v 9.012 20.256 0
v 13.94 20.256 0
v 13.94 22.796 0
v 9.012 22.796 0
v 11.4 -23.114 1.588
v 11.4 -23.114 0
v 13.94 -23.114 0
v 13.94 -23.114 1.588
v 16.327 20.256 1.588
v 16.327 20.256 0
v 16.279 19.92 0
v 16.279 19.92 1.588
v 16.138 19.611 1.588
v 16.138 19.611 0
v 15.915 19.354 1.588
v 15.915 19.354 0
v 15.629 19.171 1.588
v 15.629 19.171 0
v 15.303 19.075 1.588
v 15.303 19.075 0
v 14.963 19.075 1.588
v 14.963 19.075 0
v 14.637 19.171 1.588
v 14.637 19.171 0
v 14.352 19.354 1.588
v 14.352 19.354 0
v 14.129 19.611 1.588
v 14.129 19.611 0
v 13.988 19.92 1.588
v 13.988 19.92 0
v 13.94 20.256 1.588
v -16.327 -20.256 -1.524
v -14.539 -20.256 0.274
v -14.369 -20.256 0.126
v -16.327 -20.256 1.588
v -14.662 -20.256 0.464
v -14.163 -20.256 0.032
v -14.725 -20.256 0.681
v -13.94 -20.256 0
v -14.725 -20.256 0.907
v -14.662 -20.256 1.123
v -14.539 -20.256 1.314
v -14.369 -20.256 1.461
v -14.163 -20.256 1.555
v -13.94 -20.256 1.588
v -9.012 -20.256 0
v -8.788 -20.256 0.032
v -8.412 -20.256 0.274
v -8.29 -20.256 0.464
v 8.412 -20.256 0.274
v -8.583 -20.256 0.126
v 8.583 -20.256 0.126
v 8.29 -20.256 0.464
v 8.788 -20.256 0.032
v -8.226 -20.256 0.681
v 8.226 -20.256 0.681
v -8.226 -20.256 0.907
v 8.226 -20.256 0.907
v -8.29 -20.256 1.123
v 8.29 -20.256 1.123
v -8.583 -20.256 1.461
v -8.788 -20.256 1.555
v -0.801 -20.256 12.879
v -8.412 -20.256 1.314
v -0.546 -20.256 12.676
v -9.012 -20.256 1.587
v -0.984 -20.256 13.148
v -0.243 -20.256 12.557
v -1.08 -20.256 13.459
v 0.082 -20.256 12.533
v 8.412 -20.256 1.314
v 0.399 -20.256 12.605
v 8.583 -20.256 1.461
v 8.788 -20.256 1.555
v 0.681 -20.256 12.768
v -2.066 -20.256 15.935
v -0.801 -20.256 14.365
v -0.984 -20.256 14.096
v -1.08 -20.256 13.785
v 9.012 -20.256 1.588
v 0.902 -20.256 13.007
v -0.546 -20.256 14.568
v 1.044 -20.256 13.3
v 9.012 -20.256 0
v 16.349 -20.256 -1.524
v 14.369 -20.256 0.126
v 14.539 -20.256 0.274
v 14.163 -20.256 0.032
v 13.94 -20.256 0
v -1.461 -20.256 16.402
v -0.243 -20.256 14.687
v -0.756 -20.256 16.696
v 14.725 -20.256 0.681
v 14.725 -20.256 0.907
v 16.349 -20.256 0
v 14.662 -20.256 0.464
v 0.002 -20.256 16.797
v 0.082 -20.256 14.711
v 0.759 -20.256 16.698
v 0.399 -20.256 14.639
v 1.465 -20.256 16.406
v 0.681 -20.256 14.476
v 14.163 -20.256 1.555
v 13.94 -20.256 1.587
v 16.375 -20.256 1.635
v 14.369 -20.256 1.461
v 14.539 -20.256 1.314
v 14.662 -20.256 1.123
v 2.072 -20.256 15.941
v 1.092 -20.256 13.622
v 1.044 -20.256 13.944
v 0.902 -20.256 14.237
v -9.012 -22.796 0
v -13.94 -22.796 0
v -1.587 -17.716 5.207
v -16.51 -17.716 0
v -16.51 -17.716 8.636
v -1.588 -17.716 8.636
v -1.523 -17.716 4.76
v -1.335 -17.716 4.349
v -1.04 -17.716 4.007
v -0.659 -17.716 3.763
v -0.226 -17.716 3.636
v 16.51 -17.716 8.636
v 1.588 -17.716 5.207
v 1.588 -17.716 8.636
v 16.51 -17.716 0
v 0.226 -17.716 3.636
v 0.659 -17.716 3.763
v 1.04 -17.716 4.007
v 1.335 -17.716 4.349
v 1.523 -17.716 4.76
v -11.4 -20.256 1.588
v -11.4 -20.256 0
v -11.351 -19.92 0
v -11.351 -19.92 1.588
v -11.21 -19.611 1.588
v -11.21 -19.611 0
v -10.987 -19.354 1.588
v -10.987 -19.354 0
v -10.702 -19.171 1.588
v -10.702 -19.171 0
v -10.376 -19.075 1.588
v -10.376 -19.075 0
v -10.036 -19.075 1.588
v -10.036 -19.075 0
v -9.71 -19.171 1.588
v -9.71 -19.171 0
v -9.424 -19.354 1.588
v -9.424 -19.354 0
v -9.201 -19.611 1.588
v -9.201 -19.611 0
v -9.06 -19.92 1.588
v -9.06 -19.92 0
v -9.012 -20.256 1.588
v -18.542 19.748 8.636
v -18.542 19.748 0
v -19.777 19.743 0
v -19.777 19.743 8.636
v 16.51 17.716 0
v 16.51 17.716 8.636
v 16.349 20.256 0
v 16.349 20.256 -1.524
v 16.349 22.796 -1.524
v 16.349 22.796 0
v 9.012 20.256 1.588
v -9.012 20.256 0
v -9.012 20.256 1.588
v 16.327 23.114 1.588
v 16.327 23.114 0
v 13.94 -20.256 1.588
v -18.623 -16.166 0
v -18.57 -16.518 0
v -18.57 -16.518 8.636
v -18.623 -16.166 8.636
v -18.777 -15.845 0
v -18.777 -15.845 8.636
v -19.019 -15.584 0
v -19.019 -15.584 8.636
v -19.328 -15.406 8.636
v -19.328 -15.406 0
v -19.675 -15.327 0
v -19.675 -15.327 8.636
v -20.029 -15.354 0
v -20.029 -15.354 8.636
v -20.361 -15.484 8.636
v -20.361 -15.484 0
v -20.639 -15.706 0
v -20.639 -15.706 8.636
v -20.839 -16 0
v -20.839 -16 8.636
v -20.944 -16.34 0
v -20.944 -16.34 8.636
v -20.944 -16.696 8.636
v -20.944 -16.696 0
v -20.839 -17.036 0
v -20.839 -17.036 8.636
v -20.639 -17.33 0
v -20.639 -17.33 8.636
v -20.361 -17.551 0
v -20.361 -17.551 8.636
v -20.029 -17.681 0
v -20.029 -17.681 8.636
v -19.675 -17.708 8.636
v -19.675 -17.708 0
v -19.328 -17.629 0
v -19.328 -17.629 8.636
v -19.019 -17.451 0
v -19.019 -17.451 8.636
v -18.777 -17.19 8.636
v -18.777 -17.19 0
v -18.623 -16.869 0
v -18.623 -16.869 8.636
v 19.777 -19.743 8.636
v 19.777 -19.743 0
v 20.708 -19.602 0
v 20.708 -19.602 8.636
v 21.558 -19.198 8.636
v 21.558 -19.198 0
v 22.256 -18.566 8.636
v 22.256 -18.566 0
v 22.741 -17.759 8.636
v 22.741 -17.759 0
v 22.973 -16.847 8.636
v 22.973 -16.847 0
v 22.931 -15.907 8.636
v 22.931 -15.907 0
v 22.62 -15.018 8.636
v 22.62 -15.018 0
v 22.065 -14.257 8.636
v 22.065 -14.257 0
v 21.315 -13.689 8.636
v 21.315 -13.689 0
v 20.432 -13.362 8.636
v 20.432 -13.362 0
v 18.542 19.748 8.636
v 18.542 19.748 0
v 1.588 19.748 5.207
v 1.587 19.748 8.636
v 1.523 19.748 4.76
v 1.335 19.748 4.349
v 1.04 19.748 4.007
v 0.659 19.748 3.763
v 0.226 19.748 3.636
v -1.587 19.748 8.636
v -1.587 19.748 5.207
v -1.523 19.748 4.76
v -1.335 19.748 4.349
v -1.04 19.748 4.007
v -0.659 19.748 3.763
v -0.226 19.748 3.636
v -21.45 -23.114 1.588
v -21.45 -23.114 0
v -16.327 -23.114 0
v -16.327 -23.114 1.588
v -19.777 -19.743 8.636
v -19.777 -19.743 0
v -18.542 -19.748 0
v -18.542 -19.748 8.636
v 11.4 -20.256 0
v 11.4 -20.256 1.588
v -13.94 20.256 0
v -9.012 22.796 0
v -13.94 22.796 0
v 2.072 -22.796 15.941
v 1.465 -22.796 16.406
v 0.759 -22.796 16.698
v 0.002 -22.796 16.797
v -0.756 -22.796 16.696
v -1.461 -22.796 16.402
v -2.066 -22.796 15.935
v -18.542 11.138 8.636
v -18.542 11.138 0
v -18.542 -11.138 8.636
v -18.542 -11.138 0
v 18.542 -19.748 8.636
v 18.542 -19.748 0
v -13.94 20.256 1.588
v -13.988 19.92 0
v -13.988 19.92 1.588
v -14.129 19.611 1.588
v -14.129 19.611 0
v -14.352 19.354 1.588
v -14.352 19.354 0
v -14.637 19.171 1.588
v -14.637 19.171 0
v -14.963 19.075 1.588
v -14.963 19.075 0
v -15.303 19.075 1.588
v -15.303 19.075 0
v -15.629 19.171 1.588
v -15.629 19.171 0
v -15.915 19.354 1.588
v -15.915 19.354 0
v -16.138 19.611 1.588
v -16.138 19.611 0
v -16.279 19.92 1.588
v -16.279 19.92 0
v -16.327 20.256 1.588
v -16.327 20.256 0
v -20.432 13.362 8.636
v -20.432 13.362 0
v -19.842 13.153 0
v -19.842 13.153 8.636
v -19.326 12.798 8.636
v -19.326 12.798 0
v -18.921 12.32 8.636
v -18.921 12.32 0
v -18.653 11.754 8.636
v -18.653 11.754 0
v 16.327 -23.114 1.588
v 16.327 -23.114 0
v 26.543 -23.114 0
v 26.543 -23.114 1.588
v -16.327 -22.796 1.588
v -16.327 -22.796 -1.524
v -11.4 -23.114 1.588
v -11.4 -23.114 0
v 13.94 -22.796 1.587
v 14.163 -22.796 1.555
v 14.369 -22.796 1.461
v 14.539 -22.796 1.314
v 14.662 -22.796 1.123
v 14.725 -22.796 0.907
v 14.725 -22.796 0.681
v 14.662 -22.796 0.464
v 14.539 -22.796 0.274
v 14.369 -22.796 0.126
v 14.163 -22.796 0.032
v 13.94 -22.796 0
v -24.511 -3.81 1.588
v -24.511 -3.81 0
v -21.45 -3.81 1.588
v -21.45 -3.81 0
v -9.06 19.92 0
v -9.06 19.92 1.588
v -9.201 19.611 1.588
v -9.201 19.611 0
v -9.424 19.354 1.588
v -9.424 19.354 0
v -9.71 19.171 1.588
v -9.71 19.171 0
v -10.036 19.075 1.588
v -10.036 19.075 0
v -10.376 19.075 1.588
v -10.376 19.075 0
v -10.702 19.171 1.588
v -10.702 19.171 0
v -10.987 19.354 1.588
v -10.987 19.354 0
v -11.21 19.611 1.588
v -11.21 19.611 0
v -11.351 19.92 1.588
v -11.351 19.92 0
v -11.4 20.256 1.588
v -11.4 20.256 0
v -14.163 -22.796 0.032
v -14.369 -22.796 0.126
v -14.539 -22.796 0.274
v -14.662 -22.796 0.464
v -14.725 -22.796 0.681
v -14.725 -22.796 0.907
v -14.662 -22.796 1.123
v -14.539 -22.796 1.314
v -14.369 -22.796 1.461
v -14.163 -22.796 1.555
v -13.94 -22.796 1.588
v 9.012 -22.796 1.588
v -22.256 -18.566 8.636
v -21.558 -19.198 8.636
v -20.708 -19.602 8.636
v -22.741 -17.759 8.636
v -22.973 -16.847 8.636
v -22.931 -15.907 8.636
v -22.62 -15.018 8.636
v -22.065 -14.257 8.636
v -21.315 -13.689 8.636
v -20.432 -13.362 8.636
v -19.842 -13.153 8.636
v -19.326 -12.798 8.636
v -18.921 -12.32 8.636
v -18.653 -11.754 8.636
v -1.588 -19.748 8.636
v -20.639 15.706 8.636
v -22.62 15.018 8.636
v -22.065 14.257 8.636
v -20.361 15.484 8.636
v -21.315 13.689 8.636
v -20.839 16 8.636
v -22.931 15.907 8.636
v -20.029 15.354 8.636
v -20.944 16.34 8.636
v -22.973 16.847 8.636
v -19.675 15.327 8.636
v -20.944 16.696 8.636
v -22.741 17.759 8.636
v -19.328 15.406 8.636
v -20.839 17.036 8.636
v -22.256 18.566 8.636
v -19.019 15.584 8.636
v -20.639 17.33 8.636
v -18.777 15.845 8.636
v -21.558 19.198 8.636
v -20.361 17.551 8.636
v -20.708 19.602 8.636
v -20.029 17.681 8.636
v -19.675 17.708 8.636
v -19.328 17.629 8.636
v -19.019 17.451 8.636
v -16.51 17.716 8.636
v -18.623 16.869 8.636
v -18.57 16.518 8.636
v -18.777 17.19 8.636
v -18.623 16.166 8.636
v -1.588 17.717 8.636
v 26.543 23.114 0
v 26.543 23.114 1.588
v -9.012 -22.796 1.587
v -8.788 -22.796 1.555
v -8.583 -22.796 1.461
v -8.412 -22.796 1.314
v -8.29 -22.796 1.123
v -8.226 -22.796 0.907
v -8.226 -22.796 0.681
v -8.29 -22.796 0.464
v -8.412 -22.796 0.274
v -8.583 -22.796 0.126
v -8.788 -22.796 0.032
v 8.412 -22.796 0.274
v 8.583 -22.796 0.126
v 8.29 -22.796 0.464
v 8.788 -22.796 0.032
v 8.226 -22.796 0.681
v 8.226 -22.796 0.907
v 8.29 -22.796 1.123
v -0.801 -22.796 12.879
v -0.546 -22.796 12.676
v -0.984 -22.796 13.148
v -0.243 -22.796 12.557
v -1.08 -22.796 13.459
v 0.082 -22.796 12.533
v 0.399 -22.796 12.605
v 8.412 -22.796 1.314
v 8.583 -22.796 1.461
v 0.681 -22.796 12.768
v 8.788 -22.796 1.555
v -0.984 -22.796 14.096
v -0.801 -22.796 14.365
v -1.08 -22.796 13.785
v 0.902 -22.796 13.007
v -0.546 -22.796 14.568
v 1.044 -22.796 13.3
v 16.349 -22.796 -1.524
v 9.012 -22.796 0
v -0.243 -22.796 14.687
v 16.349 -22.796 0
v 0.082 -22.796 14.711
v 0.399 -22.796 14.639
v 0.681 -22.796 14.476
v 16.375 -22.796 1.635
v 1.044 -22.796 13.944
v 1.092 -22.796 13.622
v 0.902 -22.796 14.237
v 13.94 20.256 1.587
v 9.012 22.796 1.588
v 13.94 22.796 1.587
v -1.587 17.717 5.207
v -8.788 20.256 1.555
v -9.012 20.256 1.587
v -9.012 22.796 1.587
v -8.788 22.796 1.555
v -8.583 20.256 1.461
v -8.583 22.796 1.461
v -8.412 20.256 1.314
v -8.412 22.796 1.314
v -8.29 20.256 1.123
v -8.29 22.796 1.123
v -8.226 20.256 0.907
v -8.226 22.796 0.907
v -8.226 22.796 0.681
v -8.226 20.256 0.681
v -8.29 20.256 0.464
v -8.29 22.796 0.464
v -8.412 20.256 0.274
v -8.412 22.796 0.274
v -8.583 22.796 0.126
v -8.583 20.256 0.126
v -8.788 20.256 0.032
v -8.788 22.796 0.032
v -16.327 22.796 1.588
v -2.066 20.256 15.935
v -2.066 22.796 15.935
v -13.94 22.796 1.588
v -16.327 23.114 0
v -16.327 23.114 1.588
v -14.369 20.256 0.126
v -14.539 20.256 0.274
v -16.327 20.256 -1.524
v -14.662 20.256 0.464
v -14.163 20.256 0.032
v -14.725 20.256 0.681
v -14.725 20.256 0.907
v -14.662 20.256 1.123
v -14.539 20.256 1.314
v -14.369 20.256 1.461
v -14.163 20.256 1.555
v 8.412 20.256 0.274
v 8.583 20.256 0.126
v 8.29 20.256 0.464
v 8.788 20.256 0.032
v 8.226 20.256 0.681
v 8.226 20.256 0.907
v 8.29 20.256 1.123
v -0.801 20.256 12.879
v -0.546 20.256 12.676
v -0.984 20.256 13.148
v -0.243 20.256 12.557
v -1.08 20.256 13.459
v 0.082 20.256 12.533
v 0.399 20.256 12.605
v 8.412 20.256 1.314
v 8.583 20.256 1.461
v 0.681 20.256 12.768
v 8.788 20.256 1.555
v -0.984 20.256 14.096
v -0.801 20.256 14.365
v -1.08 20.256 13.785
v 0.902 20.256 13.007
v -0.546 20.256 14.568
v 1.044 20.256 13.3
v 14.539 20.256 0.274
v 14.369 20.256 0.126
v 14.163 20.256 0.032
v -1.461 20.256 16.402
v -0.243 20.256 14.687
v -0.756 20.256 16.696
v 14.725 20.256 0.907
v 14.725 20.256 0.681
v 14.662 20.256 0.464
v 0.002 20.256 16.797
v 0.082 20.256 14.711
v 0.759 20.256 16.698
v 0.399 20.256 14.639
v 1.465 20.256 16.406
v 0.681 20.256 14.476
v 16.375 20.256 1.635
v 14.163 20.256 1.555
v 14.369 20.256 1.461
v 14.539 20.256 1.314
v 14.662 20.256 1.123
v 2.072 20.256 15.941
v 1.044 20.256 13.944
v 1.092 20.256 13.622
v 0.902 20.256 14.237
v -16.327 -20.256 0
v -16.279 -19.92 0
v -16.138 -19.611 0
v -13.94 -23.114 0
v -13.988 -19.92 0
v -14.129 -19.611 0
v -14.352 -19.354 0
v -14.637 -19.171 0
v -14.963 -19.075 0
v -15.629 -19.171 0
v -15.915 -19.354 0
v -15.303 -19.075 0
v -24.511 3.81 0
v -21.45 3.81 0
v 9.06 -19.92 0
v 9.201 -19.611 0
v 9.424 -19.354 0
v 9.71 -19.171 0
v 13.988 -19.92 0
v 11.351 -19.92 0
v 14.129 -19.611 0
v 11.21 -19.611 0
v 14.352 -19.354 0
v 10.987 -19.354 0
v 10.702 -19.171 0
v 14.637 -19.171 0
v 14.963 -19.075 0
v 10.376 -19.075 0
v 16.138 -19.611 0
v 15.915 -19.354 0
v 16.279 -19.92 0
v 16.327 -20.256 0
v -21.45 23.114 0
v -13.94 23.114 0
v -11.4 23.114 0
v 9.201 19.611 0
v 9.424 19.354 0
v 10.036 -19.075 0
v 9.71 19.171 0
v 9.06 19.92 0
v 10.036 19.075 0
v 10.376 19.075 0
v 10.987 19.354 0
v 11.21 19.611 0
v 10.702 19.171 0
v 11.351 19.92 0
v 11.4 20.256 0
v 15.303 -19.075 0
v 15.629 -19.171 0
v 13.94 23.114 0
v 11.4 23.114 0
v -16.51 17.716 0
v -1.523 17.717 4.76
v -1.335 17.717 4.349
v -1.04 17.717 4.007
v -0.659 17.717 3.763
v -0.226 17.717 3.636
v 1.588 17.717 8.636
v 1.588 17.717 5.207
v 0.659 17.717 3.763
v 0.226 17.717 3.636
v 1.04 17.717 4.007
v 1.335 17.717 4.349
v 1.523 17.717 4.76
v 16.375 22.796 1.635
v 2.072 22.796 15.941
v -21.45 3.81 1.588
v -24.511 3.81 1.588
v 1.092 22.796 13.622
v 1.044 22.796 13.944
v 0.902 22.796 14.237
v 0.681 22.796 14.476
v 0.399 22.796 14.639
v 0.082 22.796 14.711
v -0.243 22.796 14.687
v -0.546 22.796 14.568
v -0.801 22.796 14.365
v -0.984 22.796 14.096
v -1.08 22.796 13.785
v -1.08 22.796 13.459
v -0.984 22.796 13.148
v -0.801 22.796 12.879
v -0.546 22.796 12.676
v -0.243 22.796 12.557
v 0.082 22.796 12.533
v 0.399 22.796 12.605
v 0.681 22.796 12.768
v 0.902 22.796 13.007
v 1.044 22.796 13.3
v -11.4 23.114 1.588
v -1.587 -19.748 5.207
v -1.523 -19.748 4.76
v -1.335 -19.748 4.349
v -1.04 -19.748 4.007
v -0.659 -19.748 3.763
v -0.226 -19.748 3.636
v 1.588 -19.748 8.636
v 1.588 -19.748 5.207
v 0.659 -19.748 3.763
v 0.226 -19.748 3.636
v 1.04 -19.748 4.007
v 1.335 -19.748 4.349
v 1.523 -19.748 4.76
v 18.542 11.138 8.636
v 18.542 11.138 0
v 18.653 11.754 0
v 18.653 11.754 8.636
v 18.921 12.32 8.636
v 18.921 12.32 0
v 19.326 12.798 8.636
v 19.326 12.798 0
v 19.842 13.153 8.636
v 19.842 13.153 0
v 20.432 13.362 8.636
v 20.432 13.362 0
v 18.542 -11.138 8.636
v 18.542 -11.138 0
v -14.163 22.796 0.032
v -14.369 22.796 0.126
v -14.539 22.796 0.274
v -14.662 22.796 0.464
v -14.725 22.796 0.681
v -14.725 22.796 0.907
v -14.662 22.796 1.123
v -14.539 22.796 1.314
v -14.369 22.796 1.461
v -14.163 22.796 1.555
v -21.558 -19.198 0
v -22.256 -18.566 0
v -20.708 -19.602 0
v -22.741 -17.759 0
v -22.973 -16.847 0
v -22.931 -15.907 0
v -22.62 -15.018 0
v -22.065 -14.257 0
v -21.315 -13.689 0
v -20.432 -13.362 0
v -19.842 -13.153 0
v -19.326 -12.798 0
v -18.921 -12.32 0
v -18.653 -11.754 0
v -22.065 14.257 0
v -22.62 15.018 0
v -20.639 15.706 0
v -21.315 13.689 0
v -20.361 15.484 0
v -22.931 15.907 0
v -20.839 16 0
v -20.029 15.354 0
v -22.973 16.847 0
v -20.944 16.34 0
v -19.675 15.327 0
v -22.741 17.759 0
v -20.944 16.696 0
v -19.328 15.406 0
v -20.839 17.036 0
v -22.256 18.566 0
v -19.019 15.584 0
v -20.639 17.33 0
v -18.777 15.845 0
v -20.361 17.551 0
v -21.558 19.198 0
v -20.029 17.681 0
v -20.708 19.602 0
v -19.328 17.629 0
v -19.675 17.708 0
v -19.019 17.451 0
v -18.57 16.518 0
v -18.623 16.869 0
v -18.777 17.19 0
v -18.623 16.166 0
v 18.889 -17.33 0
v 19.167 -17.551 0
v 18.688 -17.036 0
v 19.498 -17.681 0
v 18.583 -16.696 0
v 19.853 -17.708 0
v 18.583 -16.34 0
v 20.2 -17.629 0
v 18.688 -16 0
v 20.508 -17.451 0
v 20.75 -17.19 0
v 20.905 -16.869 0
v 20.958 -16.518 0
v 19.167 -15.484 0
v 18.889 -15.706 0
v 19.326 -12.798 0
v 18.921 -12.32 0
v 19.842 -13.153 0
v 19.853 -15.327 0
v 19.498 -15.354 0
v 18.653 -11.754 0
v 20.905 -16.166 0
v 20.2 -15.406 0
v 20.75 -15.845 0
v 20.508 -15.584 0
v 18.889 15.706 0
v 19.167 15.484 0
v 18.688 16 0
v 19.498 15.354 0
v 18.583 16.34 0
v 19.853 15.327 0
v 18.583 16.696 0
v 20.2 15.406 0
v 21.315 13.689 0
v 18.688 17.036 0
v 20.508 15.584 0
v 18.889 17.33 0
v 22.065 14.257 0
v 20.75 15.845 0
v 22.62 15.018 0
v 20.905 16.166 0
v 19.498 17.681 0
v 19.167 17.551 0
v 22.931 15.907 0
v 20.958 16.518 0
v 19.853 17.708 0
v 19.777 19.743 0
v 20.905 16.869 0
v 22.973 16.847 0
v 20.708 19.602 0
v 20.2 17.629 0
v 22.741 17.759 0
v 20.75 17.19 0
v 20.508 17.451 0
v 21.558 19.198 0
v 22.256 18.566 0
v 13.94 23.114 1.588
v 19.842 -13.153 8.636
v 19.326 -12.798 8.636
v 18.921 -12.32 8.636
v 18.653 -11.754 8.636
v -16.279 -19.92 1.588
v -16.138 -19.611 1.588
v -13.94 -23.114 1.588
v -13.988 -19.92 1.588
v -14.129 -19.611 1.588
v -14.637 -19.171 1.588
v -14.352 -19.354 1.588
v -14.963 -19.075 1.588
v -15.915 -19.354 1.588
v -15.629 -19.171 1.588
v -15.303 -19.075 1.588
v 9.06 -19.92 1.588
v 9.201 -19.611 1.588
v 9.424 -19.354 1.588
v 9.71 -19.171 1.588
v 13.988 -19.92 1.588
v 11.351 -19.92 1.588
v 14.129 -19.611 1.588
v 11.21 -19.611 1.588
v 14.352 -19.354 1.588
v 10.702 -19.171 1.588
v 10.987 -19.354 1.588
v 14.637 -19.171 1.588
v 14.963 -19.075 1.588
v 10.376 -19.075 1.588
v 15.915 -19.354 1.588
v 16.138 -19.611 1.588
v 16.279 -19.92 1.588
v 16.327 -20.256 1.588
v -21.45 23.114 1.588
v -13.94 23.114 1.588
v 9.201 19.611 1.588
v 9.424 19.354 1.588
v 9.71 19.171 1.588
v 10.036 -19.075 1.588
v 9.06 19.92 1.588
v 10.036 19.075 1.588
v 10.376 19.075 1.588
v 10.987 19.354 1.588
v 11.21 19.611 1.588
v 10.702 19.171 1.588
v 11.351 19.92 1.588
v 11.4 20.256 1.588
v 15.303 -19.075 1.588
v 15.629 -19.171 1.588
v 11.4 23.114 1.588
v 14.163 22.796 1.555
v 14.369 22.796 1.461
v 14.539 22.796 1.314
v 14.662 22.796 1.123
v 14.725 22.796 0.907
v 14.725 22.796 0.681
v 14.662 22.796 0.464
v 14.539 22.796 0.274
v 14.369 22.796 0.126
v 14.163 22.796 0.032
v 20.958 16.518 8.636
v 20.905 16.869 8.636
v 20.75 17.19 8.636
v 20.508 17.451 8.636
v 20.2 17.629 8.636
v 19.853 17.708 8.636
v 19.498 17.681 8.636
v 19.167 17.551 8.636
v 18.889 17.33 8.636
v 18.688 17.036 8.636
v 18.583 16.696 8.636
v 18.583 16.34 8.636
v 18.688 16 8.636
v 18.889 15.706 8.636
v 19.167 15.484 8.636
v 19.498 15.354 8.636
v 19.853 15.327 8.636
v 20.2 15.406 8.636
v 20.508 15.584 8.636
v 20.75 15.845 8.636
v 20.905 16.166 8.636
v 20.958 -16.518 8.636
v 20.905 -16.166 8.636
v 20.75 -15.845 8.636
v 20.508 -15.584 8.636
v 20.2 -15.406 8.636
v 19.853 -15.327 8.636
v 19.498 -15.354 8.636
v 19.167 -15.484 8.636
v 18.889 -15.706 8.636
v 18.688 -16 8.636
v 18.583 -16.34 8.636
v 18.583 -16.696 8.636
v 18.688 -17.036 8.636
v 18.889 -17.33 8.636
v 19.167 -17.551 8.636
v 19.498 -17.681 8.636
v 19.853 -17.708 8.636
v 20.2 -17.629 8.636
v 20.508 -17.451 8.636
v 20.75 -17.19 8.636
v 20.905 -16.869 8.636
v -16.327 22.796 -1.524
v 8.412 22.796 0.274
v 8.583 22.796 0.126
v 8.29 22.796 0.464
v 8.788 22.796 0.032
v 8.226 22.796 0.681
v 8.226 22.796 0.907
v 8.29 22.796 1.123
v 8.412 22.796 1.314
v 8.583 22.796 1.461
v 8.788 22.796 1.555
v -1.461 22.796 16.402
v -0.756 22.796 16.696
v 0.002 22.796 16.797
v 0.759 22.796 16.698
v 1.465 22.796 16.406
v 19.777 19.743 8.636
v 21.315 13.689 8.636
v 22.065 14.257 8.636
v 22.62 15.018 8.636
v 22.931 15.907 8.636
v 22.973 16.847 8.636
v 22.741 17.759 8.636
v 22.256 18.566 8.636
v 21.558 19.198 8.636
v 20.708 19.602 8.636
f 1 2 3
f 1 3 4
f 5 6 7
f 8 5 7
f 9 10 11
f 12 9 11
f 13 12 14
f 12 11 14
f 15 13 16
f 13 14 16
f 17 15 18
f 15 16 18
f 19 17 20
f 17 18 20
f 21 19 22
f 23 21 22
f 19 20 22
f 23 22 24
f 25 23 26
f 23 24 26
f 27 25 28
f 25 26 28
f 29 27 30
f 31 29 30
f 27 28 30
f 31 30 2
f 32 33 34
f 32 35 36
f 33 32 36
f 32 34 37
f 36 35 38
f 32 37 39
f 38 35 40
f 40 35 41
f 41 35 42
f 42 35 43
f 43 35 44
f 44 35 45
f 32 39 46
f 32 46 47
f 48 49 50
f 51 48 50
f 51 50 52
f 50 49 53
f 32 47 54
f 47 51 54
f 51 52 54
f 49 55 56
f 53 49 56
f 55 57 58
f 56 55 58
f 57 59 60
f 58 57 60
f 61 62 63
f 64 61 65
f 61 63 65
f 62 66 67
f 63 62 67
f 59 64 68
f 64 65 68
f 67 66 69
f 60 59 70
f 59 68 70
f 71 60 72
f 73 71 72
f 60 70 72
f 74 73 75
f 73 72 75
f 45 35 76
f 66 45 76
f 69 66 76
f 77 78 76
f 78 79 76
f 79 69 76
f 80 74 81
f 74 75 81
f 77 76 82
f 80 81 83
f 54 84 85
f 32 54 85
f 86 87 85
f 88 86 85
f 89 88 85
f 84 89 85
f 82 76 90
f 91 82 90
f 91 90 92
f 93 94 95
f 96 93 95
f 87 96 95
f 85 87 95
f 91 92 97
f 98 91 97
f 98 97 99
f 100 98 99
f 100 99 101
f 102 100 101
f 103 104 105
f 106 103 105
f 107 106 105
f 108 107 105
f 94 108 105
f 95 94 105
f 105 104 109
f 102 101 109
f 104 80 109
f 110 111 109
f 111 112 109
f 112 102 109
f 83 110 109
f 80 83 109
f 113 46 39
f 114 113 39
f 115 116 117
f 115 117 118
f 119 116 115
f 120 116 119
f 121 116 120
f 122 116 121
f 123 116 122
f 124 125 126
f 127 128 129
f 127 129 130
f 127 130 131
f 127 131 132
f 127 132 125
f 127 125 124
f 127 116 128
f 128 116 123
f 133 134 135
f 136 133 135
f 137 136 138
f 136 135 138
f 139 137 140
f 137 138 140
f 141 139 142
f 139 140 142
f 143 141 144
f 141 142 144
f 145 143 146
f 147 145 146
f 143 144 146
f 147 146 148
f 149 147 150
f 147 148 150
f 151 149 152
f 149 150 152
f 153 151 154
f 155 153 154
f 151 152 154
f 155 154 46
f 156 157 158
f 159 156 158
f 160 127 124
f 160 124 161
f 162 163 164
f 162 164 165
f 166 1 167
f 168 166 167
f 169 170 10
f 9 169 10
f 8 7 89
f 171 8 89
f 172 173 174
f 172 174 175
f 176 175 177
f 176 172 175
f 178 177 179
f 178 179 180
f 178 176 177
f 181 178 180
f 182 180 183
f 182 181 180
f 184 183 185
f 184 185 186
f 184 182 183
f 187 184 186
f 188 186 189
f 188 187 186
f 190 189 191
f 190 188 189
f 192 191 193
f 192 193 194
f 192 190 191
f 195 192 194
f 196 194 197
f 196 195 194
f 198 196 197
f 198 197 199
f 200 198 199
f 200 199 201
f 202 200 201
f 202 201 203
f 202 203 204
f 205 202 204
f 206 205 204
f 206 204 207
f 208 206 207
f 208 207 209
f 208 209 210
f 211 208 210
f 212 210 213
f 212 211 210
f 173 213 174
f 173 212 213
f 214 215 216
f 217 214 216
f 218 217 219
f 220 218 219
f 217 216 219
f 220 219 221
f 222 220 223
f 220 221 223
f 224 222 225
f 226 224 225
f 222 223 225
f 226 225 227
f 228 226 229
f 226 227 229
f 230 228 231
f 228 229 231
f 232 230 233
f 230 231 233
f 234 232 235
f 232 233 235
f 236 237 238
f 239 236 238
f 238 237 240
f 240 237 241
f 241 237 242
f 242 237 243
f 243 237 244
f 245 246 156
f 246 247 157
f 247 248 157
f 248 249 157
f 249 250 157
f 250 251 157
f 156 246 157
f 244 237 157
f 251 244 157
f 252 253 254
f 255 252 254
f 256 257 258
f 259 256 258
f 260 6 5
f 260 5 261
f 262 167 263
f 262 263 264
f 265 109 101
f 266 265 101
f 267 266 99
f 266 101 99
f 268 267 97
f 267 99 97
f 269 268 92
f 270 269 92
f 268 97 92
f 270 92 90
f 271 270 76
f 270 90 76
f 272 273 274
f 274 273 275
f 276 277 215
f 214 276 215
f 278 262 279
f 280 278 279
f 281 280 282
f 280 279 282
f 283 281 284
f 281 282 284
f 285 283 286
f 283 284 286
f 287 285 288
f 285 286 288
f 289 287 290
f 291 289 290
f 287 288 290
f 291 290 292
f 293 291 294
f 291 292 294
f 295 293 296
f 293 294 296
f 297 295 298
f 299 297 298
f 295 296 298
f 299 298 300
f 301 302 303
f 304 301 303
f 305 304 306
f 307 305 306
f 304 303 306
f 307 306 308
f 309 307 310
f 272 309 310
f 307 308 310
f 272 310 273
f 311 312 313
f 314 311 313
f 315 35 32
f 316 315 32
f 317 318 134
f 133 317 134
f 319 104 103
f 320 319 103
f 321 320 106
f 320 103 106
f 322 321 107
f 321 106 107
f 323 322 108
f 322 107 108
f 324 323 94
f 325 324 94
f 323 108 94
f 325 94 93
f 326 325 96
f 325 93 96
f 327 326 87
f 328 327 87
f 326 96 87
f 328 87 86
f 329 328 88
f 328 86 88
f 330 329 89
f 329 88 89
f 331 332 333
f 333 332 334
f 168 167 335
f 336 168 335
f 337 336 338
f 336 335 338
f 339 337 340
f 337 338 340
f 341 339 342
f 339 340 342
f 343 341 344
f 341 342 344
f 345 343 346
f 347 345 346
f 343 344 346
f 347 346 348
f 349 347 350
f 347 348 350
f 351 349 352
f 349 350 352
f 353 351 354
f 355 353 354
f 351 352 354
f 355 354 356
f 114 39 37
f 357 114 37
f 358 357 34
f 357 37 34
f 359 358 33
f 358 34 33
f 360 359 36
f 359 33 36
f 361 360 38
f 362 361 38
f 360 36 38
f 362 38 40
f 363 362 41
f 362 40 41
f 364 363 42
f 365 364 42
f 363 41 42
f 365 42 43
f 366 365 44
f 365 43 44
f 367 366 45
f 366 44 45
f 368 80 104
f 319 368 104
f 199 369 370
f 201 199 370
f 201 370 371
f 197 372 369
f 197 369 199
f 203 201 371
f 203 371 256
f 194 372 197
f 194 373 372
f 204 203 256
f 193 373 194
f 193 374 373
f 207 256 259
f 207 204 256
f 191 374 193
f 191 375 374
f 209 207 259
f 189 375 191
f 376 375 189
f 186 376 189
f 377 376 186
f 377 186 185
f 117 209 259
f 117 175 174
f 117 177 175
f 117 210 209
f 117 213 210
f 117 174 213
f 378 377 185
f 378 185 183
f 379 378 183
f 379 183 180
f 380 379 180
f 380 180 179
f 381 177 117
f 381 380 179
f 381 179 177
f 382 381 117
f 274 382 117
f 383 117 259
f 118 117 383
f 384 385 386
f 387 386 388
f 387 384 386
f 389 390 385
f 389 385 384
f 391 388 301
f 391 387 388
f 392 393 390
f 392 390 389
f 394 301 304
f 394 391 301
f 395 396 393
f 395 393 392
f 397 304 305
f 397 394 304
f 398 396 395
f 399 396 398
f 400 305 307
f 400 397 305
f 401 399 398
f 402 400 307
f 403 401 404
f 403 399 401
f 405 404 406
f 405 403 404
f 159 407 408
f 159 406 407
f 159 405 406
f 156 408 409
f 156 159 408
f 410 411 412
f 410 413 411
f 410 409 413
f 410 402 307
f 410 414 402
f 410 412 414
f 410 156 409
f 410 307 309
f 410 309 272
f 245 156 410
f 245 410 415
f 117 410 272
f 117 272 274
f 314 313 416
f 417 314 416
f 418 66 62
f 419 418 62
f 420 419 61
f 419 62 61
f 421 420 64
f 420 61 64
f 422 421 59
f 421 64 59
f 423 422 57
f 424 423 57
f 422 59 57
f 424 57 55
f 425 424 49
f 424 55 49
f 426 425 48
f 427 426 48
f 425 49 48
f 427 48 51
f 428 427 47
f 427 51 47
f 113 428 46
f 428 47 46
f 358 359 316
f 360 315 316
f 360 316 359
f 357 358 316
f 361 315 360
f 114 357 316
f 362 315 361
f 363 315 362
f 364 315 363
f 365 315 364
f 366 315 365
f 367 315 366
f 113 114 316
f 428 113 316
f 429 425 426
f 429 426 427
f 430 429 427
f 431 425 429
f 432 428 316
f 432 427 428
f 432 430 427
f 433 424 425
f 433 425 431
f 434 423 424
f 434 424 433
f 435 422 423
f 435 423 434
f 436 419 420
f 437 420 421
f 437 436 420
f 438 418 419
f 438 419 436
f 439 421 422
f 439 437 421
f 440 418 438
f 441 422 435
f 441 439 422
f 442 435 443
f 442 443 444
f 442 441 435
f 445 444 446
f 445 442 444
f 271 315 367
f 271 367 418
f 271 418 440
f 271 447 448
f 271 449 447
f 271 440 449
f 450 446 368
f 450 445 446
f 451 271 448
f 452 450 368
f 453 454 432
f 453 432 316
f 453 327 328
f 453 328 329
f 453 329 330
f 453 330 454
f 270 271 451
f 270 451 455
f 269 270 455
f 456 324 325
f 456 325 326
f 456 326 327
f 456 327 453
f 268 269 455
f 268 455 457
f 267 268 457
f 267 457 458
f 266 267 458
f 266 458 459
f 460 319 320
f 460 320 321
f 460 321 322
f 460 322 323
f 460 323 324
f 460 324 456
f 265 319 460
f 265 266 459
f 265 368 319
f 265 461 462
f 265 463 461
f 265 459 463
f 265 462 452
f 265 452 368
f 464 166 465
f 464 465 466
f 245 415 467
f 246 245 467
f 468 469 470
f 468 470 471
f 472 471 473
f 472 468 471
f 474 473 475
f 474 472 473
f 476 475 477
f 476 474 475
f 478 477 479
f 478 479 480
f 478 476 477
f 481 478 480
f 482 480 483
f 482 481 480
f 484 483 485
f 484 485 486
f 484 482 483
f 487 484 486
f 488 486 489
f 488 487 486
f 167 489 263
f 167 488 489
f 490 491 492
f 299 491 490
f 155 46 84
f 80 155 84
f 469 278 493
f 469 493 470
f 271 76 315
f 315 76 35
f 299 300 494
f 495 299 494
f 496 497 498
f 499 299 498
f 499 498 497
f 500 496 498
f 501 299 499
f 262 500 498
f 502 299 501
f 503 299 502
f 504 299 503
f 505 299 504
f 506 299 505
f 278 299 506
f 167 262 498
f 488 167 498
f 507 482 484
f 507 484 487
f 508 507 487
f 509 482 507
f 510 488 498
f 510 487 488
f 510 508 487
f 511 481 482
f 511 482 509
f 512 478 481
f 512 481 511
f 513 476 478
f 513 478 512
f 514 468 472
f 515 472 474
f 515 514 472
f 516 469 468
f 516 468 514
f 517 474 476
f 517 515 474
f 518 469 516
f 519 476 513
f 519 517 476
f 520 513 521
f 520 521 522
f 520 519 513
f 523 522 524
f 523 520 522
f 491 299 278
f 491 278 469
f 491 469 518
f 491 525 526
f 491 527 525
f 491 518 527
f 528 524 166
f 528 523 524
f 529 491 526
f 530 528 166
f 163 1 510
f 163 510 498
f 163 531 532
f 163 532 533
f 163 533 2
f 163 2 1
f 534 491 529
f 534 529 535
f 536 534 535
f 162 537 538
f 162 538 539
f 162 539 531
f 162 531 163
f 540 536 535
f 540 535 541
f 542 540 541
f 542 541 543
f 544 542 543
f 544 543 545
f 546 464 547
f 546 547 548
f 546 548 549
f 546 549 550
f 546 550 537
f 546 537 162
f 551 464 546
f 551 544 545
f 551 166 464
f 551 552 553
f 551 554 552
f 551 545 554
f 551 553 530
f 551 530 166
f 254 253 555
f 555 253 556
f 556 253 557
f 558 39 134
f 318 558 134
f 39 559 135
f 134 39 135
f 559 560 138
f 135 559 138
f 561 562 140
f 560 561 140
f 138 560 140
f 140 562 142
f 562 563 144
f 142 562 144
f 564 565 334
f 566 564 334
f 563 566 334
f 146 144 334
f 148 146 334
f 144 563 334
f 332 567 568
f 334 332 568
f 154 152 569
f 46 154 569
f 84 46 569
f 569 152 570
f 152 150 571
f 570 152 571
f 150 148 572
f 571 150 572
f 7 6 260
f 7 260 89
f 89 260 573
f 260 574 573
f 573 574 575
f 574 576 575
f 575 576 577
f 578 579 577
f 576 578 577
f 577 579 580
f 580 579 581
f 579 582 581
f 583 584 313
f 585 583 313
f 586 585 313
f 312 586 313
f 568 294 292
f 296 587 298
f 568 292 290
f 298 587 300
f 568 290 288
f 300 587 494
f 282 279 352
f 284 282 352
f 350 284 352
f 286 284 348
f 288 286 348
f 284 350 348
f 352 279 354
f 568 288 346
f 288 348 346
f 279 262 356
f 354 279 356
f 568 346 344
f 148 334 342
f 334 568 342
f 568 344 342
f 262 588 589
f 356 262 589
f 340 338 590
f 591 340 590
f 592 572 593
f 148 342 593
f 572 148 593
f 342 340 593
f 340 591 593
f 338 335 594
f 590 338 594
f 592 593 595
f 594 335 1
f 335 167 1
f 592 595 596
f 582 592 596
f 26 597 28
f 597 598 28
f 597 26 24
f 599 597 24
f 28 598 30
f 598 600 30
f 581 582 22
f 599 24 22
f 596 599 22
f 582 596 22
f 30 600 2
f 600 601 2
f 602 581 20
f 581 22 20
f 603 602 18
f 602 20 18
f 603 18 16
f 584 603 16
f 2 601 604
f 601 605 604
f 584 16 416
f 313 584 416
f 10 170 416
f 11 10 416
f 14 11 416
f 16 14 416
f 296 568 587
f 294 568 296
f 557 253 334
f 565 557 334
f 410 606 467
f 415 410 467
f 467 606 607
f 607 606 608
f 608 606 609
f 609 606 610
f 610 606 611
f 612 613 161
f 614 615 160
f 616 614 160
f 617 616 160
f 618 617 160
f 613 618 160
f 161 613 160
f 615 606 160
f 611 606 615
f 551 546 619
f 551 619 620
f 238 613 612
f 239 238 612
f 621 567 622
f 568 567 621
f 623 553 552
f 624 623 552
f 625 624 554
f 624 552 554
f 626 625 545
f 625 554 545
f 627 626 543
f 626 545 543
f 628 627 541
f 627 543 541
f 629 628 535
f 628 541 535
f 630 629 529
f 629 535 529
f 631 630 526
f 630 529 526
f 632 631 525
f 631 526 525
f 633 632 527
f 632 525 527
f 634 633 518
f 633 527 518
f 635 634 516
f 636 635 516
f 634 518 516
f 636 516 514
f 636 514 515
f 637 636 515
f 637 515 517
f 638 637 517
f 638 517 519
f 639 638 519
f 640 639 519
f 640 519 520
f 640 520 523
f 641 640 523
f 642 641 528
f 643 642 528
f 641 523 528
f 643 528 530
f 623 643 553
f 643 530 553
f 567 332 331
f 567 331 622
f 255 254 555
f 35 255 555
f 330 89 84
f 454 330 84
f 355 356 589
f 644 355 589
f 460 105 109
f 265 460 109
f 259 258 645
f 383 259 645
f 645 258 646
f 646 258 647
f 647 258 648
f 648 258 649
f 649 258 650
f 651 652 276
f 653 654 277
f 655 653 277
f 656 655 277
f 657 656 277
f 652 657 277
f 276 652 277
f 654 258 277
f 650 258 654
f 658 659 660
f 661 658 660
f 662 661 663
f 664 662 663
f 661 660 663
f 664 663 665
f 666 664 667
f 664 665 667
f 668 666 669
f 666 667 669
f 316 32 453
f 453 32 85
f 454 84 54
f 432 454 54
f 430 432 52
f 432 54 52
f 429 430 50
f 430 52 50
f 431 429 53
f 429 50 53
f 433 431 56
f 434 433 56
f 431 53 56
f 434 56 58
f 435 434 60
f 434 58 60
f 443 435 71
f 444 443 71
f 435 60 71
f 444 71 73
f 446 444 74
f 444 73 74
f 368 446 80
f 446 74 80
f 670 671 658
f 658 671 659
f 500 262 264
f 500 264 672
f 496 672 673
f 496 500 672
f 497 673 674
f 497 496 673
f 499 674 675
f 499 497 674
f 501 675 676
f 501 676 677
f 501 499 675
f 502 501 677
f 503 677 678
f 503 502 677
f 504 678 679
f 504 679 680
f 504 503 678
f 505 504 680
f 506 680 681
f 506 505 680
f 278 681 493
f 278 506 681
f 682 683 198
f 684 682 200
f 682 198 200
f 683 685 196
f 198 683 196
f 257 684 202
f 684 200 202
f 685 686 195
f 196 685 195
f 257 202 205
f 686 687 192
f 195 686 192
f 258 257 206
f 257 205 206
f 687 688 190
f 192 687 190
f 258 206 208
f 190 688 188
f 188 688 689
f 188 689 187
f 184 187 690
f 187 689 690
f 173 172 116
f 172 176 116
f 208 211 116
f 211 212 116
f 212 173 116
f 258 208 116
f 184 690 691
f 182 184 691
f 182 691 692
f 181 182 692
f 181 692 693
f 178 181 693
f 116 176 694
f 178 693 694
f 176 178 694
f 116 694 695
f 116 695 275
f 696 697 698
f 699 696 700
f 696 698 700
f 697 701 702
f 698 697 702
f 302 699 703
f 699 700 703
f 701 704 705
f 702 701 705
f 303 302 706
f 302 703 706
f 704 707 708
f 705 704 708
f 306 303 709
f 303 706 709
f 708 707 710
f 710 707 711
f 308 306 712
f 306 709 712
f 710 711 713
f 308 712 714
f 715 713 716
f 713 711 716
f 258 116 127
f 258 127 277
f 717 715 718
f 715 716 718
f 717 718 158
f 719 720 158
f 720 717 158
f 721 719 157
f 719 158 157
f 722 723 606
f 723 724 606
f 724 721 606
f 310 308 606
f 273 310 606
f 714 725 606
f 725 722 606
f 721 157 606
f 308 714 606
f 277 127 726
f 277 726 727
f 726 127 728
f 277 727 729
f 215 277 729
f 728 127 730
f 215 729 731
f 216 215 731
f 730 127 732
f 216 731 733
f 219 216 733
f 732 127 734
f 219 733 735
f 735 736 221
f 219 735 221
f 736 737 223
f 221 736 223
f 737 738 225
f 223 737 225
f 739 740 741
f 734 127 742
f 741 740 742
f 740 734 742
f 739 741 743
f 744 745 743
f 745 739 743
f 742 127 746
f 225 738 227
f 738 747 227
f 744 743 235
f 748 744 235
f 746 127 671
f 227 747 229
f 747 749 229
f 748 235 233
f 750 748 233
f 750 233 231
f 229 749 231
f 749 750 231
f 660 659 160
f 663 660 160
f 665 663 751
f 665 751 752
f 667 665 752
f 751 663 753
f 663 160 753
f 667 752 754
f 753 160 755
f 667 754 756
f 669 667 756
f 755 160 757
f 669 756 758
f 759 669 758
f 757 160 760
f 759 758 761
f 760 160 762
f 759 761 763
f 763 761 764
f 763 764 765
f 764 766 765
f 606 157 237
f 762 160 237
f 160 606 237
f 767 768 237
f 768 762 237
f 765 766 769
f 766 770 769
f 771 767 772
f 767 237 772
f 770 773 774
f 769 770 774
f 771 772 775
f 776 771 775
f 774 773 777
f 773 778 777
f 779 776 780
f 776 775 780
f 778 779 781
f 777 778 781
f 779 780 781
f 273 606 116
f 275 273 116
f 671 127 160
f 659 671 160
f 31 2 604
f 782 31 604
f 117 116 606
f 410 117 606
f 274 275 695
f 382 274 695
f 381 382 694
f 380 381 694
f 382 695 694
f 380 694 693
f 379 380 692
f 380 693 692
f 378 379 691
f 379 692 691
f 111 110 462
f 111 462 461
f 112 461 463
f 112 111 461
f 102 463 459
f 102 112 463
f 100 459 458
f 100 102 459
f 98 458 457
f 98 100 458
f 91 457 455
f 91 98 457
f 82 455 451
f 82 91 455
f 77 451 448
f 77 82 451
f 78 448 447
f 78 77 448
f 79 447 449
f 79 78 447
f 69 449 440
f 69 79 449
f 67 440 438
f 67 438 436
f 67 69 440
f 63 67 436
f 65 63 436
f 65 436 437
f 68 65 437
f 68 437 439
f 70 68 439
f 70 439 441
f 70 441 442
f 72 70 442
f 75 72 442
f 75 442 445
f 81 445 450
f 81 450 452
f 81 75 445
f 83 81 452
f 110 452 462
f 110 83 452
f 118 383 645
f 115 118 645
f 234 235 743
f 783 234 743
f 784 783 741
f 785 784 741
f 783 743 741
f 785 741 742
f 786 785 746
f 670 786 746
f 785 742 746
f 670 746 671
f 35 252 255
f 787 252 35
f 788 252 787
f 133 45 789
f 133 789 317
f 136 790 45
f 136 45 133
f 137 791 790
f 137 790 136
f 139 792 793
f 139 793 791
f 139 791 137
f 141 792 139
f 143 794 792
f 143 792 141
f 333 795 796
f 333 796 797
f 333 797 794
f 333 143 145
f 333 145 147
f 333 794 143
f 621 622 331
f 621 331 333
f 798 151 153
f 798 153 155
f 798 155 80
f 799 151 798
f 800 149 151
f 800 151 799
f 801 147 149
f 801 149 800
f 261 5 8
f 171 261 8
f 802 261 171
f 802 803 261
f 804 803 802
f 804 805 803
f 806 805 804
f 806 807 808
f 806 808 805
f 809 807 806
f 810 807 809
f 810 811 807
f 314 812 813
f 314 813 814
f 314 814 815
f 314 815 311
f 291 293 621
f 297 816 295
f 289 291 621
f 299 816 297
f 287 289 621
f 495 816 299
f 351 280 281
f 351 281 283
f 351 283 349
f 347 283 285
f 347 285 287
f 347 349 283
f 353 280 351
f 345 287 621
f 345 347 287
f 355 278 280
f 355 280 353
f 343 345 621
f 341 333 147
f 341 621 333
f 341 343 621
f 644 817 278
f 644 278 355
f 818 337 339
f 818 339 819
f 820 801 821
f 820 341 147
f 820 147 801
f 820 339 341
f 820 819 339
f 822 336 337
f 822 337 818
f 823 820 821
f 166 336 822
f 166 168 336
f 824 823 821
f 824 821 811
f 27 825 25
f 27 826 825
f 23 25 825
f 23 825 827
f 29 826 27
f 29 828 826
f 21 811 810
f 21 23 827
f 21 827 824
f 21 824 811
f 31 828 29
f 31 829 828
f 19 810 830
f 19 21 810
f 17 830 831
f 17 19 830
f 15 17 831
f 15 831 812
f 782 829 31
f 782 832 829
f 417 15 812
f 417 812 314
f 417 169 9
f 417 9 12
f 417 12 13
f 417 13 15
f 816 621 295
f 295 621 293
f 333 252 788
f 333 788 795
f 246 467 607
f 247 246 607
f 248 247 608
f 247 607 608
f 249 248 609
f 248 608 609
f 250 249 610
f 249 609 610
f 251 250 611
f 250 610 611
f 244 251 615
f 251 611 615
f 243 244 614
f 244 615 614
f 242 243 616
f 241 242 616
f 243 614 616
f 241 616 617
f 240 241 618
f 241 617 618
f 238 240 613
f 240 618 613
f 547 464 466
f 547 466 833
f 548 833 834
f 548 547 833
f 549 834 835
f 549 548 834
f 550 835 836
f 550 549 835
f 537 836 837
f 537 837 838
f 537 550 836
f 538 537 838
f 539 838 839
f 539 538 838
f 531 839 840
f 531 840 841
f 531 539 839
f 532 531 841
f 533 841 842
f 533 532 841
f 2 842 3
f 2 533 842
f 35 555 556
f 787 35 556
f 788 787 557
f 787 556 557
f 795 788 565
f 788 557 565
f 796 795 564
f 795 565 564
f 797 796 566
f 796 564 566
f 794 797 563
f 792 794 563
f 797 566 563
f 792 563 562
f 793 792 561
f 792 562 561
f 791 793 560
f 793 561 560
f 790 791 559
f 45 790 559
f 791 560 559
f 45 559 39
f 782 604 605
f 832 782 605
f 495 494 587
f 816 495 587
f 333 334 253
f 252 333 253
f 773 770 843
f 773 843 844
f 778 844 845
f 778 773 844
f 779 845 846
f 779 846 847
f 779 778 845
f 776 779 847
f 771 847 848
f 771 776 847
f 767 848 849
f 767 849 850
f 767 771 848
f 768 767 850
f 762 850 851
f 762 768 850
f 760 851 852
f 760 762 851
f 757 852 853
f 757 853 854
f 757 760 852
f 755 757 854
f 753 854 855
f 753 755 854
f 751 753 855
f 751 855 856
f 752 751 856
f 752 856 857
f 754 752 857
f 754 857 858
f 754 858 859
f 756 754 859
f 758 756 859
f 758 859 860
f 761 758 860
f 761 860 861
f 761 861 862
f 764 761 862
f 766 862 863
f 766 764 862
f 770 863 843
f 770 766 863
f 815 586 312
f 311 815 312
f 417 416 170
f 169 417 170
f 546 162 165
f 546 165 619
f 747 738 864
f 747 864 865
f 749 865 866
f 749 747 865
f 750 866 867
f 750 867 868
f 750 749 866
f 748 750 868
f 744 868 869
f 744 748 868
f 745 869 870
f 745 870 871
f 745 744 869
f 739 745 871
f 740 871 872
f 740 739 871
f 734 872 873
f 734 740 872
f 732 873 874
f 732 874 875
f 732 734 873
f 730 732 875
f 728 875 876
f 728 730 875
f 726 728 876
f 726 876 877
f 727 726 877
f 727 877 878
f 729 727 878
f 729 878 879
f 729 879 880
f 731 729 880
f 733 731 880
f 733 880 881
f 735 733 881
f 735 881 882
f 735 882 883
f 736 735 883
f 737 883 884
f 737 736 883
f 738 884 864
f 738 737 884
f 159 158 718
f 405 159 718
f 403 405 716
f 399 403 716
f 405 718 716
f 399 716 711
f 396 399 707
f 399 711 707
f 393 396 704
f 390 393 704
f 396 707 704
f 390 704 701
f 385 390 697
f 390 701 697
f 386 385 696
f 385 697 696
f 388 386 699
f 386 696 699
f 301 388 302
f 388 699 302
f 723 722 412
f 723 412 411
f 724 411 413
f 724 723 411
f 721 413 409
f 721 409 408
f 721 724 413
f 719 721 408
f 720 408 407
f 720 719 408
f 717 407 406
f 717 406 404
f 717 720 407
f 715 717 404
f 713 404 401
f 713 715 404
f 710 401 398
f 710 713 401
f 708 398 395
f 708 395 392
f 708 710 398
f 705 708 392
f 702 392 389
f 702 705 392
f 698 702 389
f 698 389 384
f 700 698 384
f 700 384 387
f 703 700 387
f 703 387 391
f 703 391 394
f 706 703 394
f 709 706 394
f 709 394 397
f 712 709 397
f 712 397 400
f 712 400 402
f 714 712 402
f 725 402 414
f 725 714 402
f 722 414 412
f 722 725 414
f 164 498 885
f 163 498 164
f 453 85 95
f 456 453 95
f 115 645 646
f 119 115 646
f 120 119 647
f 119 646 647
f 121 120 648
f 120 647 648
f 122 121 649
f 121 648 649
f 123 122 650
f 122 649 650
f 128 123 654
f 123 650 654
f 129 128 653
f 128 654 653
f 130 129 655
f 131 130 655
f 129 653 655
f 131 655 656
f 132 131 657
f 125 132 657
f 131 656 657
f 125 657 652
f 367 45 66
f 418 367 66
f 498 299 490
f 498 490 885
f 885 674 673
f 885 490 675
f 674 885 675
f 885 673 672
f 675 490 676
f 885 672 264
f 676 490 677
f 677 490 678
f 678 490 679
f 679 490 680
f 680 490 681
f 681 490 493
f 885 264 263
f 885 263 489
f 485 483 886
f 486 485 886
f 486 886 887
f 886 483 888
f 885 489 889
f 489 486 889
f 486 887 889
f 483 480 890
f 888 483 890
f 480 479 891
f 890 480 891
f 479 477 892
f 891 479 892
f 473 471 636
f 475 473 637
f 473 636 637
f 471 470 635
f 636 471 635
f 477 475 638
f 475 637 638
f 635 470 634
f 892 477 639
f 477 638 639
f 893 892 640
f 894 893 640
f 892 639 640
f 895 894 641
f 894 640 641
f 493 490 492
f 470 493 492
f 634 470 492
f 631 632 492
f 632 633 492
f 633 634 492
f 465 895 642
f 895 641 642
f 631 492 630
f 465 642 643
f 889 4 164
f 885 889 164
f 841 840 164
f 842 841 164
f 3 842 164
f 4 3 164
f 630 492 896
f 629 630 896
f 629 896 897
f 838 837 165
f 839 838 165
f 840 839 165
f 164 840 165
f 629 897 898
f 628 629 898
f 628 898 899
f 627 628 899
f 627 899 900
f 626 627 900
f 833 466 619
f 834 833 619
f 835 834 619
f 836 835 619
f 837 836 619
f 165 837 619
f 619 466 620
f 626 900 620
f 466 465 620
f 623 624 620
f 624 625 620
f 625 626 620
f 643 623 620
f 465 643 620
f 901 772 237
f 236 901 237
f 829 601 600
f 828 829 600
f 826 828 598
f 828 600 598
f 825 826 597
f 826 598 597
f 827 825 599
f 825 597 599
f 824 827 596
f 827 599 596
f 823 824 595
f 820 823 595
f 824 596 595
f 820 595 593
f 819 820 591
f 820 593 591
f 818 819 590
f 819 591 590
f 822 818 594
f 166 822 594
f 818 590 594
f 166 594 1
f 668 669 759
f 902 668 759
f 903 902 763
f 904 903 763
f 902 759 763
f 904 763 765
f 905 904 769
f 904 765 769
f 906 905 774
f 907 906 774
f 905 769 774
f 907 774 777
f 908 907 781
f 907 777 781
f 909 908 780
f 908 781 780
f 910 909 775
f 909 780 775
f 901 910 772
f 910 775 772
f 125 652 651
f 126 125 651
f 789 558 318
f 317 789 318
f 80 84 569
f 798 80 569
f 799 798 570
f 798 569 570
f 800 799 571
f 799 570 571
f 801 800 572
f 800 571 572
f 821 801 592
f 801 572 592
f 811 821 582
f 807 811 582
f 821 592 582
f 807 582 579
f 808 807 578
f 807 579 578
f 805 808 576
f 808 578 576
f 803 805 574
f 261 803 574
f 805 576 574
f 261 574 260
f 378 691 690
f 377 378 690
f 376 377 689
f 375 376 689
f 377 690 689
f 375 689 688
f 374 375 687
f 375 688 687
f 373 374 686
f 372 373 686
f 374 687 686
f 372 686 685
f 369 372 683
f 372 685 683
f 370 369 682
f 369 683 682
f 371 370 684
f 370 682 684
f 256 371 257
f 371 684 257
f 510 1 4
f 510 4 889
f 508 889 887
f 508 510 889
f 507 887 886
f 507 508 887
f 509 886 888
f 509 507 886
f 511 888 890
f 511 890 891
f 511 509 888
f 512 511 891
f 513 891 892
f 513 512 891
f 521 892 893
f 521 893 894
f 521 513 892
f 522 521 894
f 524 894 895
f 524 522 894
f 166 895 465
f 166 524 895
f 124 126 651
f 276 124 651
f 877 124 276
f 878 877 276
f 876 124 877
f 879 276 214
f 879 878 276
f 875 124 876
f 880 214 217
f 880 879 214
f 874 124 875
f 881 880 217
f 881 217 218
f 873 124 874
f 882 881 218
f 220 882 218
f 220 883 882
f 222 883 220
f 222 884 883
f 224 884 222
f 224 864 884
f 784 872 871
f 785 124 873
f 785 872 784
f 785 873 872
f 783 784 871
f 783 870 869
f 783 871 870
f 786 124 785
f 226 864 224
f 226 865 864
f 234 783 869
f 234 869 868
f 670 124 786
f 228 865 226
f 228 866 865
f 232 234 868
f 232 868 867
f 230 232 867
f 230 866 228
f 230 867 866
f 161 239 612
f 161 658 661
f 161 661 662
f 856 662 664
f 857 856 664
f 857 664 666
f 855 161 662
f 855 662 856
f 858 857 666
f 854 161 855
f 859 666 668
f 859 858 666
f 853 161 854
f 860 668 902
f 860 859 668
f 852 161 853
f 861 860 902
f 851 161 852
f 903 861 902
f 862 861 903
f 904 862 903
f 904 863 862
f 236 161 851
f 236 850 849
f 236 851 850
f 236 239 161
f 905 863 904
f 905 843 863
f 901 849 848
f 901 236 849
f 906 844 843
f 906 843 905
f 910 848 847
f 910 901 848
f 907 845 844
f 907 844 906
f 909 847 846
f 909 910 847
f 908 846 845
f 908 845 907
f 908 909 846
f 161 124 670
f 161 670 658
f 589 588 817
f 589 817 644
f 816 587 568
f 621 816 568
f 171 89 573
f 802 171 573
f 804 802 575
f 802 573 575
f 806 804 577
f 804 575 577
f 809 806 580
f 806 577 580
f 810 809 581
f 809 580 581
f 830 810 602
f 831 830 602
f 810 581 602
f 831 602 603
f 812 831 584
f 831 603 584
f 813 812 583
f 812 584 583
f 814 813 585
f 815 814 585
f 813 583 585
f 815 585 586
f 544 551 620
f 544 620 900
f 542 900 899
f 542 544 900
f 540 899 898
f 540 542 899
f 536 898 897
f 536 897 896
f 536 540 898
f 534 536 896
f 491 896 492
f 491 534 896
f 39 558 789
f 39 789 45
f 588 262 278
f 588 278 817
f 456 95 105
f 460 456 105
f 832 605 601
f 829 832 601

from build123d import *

# Parameters (mm, degrees)
F0_W     = 3.0607
F0_H     = 7.62
F0_W_2   = 2.54
F0_H_2   = 2.8575
F1_DEPTH = 1.5875
F2_R     = 1.0922
F3_DEPTH = 2.54
F5_W     = 33.02
F5_H     = 35.433
F5_R     = 1.1938
F6_DEPTH = 8.636
F8_DEPTH = 42.8635


with BuildPart() as f1:
    # F0 (on Top) → F1 (new body)
    with BuildSketch(Plane.XY):
        with BuildLine():
            Line((-16.32712, 23.114), (-21.4503, 23.114))
            Line((-21.4503, 23.114), (-21.4503, 3.81))
            Line((-21.4503, 3.81), (-21.4503, -3.81))
            Line((-21.4503, -3.81), (-21.4503, -23.114))
            Line((-21.4503, -23.114), (-16.32712, -23.114))
            Line((-16.32712, -23.114), (-16.32712, -20.2565))
            ThreePointArc((-16.32712, -20.2565), (-15.13332, -19.0627), (-13.93952, -20.2565))
            Line((-13.93952, -20.2565), (-11.39952, -20.2565))
            ThreePointArc((-11.39952, -20.2565), (-10.20572, -19.0627), (-9.01192, -20.2565))
            Line((-9.01192, -20.2565), (9.01192, -20.2565))
            ThreePointArc((9.01192, -20.2565), (10.20572, -19.0627), (11.39952, -20.2565))
            Line((11.39952, -20.2565), (13.93952, -20.2565))
            ThreePointArc((13.93952, -20.2565), (15.13332, -19.0627), (16.32712, -20.2565))
            Line((16.32712, -20.2565), (16.32712, -23.114))
            Line((16.32712, -23.114), (21.4503, -23.114))
            Line((21.4503, -23.114), (26.543, -23.114))
            Line((26.543, -23.114), (26.543, 23.114))
            Line((26.543, 23.114), (21.4503, 23.114))
            Line((21.4503, 23.114), (16.32712, 23.114))
            Line((16.32712, 23.114), (16.32712, 20.2565))
            ThreePointArc((16.32712, 20.2565), (15.13332, 19.0627), (13.93952, 20.2565))
            Line((13.93952, 20.2565), (13.93952, 23.114))
            Line((13.93952, 23.114), (11.39952, 23.114))
            Line((11.39952, 23.114), (11.39952, 20.2565))
            ThreePointArc((11.39952, 20.2565), (10.20572, 19.0627), (9.01192, 20.2565))
            Line((9.01192, 20.2565), (-9.01192, 20.2565))
            ThreePointArc((-9.01192, 20.2565), (-10.20572, 19.0627), (-11.39952, 20.2565))
            Line((-11.39952, 20.2565), (-13.93952, 20.2565))
            ThreePointArc((-13.93952, 20.2565), (-15.13332, 19.0627), (-16.32712, 20.2565))
            Line((-16.32712, 20.2565), (-16.32712, 23.114))
        make_face()
        with Locations((-22.98065, 0)):
            Rectangle(F0_W, F0_H)
        with Locations((-12.66952, 21.68525)):
            Rectangle(F0_W_2, F0_H_2)
        with Locations((-12.66952, -21.68525)):
            Rectangle(F0_W_2, F0_H_2)
        with Locations((12.66952, -21.68525)):
            Rectangle(F0_W_2, F0_H_2)
    extrude(amount=F1_DEPTH)


with BuildPart() as f3:
    # F2 (on face) → F3 (new body)
    with BuildSketch(Plane.XZ.offset(20.2565)):
        with BuildLine():
            Line((-11.39952, 1.5875), (-9.01192, 1.5875))
            ThreePointArc((-9.01192, 1.5875), (-8.21817, 0.79375), (-9.01192, 0))
            Line((-9.01192, 0), (9.01192, 0))
            ThreePointArc((9.01192, 0), (8.21817, 0.79375), (9.01192, 1.5875))
            Line((9.01192, 1.5875), (11.39952, 1.5875))
            Line((11.39952, 1.5875), (13.93952, 1.5875))
            ThreePointArc((13.93952, 1.5875), (14.73327, 0.79375), (13.93952, 0))
            Line((13.93952, 0), (16.32712, 0))
            Line((16.32712, 0), (16.3492485881, 0))
            Line((16.3492485881, 0), (16.3747225774, 1.6349537815))
            Line((16.3747225774, 1.6349537815), (2.0716986414, 15.941246014))
            ThreePointArc((2.0716986414, 15.941246014), (0.0017651203, 16.79702), (-2.0656760542, 15.9352422522))
            Line((-2.0656760542, 15.9352422522), (-16.32712, 1.5875))
            Line((-16.32712, 1.5875), (-16.32712, 0))
            Line((-16.32712, 0), (-13.93952, 0))
            ThreePointArc((-13.93952, 0), (-14.73327, 0.79375), (-13.93952, 1.5875))
            Line((-13.93952, 1.5875), (-11.39952, 1.5875))
        make_face()
        with Locations((0, 13.6220204907)):
            Circle(F2_R, mode=Mode.SUBTRACT)
        Polygon((9.01192, 0), (-9.01192, 0), (-11.39952, 0), (-13.93952, 0), (-16.32712, 0), (-16.32712, -1.524), (16.3492485881, -1.524), (16.3492485881, 0), (16.32712, 0), (13.93952, 0), (11.39952, 0), align=None)
    extrude(amount=F3_DEPTH)


with BuildPart() as f4_1:
    # F4: instance of F3
    add(f3.part.mirror(Plane.XZ))


with BuildPart() as f6:
    # F5 (on Top) → F6 (new body)
    with BuildSketch(Plane.XY):
        Polygon((18.542, 19.7485), (-18.542, 19.7485), (-18.542, 11.1380089074), (-18.542, -11.1380089074), (-18.542, -19.7485), (18.542, -19.7485), (18.542, -11.1380089074), (18.542, 11.1380089074), align=None)
        Rectangle(F5_W, F5_H, mode=Mode.SUBTRACT)
        with BuildLine():
            Line((-18.542, 11.1380089074), (-18.542, 19.7485))
            Line((-18.542, 19.7485), (-19.7770799466, 19.7433924169))
            ThreePointArc((-19.7770799466, 19.7433924169), (-22.972674971, 16.8470467627), (-20.4322050252, 13.36184115))
            ThreePointArc((-20.4322050252, 13.36184115), (-19.1077469534, 12.5723683185), (-18.542, 11.1380089074))
        make_face()
        with Locations((-19.76374, 16.51762)):
            Circle(F5_R, mode=Mode.SUBTRACT)
        with BuildLine():
            Line((19.7770799466, 19.7433924169), (18.542, 19.7485))
            Line((18.542, 19.7485), (18.542, 11.1380089074))
            ThreePointArc((18.542, 11.1380089074), (19.1077469534, 12.5723683185), (20.4322050252, 13.36184115))
            ThreePointArc((20.4322050252, 13.36184115), (22.972674971, 16.8470467627), (19.7770799466, 19.7433924169))
        make_face()
        with Locations((19.76374, 16.51762)):
            Circle(F5_R, mode=Mode.SUBTRACT)
        with BuildLine():
            ThreePointArc((20.4322050252, -13.36184115), (19.1077469534, -12.5723683185), (18.542, -11.1380089074))
            Line((18.542, -11.1380089074), (18.542, -19.7485))
            Line((18.542, -19.7485), (19.7770799466, -19.7433924169))
            ThreePointArc((19.7770799466, -19.7433924169), (22.972674971, -16.8470467627), (20.4322050252, -13.36184115))
        make_face()
        with Locations((19.76374, -16.51762)):
            Circle(F5_R, mode=Mode.SUBTRACT)
        with BuildLine():
            Line((-18.542, -19.7485), (-18.542, -11.1380089074))
            ThreePointArc((-18.542, -11.1380089074), (-19.1077469534, -12.5723683185), (-20.4322050252, -13.36184115))
            ThreePointArc((-20.4322050252, -13.36184115), (-22.972674971, -16.8470467627), (-19.7770799466, -19.7433924169))
            Line((-19.7770799466, -19.7433924169), (-18.542, -19.7485))
        make_face()
        with Locations((-19.76374, -16.51762)):
            Circle(F5_R, mode=Mode.SUBTRACT)
    extrude(amount=F6_DEPTH)

    # F7 (on face) → F8 (cut, through all)
    with BuildSketch(Plane.XZ.offset(19.7485)):
        with BuildLine():
            ThreePointArc((1.5875, 5.207), (0, 6.7945), (-1.5875, 5.207))
            ThreePointArc((-1.5875, 5.207), (0, 3.6195), (1.5875, 5.207))
        make_face()
        with BuildLine():
            Line((1.5875, 8.636), (-1.5875, 8.636))
            Line((-1.5875, 8.636), (-1.5875, 5.207))
            ThreePointArc((-1.5875, 5.207), (0, 6.7945), (1.5875, 5.207))
            Line((1.5875, 5.207), (1.5875, 8.636))
        make_face()
    extrude(amount=-F8_DEPTH, mode=Mode.SUBTRACT)


solid = Compound([f1.part, f3.part, f4_1.part, f6.part])
